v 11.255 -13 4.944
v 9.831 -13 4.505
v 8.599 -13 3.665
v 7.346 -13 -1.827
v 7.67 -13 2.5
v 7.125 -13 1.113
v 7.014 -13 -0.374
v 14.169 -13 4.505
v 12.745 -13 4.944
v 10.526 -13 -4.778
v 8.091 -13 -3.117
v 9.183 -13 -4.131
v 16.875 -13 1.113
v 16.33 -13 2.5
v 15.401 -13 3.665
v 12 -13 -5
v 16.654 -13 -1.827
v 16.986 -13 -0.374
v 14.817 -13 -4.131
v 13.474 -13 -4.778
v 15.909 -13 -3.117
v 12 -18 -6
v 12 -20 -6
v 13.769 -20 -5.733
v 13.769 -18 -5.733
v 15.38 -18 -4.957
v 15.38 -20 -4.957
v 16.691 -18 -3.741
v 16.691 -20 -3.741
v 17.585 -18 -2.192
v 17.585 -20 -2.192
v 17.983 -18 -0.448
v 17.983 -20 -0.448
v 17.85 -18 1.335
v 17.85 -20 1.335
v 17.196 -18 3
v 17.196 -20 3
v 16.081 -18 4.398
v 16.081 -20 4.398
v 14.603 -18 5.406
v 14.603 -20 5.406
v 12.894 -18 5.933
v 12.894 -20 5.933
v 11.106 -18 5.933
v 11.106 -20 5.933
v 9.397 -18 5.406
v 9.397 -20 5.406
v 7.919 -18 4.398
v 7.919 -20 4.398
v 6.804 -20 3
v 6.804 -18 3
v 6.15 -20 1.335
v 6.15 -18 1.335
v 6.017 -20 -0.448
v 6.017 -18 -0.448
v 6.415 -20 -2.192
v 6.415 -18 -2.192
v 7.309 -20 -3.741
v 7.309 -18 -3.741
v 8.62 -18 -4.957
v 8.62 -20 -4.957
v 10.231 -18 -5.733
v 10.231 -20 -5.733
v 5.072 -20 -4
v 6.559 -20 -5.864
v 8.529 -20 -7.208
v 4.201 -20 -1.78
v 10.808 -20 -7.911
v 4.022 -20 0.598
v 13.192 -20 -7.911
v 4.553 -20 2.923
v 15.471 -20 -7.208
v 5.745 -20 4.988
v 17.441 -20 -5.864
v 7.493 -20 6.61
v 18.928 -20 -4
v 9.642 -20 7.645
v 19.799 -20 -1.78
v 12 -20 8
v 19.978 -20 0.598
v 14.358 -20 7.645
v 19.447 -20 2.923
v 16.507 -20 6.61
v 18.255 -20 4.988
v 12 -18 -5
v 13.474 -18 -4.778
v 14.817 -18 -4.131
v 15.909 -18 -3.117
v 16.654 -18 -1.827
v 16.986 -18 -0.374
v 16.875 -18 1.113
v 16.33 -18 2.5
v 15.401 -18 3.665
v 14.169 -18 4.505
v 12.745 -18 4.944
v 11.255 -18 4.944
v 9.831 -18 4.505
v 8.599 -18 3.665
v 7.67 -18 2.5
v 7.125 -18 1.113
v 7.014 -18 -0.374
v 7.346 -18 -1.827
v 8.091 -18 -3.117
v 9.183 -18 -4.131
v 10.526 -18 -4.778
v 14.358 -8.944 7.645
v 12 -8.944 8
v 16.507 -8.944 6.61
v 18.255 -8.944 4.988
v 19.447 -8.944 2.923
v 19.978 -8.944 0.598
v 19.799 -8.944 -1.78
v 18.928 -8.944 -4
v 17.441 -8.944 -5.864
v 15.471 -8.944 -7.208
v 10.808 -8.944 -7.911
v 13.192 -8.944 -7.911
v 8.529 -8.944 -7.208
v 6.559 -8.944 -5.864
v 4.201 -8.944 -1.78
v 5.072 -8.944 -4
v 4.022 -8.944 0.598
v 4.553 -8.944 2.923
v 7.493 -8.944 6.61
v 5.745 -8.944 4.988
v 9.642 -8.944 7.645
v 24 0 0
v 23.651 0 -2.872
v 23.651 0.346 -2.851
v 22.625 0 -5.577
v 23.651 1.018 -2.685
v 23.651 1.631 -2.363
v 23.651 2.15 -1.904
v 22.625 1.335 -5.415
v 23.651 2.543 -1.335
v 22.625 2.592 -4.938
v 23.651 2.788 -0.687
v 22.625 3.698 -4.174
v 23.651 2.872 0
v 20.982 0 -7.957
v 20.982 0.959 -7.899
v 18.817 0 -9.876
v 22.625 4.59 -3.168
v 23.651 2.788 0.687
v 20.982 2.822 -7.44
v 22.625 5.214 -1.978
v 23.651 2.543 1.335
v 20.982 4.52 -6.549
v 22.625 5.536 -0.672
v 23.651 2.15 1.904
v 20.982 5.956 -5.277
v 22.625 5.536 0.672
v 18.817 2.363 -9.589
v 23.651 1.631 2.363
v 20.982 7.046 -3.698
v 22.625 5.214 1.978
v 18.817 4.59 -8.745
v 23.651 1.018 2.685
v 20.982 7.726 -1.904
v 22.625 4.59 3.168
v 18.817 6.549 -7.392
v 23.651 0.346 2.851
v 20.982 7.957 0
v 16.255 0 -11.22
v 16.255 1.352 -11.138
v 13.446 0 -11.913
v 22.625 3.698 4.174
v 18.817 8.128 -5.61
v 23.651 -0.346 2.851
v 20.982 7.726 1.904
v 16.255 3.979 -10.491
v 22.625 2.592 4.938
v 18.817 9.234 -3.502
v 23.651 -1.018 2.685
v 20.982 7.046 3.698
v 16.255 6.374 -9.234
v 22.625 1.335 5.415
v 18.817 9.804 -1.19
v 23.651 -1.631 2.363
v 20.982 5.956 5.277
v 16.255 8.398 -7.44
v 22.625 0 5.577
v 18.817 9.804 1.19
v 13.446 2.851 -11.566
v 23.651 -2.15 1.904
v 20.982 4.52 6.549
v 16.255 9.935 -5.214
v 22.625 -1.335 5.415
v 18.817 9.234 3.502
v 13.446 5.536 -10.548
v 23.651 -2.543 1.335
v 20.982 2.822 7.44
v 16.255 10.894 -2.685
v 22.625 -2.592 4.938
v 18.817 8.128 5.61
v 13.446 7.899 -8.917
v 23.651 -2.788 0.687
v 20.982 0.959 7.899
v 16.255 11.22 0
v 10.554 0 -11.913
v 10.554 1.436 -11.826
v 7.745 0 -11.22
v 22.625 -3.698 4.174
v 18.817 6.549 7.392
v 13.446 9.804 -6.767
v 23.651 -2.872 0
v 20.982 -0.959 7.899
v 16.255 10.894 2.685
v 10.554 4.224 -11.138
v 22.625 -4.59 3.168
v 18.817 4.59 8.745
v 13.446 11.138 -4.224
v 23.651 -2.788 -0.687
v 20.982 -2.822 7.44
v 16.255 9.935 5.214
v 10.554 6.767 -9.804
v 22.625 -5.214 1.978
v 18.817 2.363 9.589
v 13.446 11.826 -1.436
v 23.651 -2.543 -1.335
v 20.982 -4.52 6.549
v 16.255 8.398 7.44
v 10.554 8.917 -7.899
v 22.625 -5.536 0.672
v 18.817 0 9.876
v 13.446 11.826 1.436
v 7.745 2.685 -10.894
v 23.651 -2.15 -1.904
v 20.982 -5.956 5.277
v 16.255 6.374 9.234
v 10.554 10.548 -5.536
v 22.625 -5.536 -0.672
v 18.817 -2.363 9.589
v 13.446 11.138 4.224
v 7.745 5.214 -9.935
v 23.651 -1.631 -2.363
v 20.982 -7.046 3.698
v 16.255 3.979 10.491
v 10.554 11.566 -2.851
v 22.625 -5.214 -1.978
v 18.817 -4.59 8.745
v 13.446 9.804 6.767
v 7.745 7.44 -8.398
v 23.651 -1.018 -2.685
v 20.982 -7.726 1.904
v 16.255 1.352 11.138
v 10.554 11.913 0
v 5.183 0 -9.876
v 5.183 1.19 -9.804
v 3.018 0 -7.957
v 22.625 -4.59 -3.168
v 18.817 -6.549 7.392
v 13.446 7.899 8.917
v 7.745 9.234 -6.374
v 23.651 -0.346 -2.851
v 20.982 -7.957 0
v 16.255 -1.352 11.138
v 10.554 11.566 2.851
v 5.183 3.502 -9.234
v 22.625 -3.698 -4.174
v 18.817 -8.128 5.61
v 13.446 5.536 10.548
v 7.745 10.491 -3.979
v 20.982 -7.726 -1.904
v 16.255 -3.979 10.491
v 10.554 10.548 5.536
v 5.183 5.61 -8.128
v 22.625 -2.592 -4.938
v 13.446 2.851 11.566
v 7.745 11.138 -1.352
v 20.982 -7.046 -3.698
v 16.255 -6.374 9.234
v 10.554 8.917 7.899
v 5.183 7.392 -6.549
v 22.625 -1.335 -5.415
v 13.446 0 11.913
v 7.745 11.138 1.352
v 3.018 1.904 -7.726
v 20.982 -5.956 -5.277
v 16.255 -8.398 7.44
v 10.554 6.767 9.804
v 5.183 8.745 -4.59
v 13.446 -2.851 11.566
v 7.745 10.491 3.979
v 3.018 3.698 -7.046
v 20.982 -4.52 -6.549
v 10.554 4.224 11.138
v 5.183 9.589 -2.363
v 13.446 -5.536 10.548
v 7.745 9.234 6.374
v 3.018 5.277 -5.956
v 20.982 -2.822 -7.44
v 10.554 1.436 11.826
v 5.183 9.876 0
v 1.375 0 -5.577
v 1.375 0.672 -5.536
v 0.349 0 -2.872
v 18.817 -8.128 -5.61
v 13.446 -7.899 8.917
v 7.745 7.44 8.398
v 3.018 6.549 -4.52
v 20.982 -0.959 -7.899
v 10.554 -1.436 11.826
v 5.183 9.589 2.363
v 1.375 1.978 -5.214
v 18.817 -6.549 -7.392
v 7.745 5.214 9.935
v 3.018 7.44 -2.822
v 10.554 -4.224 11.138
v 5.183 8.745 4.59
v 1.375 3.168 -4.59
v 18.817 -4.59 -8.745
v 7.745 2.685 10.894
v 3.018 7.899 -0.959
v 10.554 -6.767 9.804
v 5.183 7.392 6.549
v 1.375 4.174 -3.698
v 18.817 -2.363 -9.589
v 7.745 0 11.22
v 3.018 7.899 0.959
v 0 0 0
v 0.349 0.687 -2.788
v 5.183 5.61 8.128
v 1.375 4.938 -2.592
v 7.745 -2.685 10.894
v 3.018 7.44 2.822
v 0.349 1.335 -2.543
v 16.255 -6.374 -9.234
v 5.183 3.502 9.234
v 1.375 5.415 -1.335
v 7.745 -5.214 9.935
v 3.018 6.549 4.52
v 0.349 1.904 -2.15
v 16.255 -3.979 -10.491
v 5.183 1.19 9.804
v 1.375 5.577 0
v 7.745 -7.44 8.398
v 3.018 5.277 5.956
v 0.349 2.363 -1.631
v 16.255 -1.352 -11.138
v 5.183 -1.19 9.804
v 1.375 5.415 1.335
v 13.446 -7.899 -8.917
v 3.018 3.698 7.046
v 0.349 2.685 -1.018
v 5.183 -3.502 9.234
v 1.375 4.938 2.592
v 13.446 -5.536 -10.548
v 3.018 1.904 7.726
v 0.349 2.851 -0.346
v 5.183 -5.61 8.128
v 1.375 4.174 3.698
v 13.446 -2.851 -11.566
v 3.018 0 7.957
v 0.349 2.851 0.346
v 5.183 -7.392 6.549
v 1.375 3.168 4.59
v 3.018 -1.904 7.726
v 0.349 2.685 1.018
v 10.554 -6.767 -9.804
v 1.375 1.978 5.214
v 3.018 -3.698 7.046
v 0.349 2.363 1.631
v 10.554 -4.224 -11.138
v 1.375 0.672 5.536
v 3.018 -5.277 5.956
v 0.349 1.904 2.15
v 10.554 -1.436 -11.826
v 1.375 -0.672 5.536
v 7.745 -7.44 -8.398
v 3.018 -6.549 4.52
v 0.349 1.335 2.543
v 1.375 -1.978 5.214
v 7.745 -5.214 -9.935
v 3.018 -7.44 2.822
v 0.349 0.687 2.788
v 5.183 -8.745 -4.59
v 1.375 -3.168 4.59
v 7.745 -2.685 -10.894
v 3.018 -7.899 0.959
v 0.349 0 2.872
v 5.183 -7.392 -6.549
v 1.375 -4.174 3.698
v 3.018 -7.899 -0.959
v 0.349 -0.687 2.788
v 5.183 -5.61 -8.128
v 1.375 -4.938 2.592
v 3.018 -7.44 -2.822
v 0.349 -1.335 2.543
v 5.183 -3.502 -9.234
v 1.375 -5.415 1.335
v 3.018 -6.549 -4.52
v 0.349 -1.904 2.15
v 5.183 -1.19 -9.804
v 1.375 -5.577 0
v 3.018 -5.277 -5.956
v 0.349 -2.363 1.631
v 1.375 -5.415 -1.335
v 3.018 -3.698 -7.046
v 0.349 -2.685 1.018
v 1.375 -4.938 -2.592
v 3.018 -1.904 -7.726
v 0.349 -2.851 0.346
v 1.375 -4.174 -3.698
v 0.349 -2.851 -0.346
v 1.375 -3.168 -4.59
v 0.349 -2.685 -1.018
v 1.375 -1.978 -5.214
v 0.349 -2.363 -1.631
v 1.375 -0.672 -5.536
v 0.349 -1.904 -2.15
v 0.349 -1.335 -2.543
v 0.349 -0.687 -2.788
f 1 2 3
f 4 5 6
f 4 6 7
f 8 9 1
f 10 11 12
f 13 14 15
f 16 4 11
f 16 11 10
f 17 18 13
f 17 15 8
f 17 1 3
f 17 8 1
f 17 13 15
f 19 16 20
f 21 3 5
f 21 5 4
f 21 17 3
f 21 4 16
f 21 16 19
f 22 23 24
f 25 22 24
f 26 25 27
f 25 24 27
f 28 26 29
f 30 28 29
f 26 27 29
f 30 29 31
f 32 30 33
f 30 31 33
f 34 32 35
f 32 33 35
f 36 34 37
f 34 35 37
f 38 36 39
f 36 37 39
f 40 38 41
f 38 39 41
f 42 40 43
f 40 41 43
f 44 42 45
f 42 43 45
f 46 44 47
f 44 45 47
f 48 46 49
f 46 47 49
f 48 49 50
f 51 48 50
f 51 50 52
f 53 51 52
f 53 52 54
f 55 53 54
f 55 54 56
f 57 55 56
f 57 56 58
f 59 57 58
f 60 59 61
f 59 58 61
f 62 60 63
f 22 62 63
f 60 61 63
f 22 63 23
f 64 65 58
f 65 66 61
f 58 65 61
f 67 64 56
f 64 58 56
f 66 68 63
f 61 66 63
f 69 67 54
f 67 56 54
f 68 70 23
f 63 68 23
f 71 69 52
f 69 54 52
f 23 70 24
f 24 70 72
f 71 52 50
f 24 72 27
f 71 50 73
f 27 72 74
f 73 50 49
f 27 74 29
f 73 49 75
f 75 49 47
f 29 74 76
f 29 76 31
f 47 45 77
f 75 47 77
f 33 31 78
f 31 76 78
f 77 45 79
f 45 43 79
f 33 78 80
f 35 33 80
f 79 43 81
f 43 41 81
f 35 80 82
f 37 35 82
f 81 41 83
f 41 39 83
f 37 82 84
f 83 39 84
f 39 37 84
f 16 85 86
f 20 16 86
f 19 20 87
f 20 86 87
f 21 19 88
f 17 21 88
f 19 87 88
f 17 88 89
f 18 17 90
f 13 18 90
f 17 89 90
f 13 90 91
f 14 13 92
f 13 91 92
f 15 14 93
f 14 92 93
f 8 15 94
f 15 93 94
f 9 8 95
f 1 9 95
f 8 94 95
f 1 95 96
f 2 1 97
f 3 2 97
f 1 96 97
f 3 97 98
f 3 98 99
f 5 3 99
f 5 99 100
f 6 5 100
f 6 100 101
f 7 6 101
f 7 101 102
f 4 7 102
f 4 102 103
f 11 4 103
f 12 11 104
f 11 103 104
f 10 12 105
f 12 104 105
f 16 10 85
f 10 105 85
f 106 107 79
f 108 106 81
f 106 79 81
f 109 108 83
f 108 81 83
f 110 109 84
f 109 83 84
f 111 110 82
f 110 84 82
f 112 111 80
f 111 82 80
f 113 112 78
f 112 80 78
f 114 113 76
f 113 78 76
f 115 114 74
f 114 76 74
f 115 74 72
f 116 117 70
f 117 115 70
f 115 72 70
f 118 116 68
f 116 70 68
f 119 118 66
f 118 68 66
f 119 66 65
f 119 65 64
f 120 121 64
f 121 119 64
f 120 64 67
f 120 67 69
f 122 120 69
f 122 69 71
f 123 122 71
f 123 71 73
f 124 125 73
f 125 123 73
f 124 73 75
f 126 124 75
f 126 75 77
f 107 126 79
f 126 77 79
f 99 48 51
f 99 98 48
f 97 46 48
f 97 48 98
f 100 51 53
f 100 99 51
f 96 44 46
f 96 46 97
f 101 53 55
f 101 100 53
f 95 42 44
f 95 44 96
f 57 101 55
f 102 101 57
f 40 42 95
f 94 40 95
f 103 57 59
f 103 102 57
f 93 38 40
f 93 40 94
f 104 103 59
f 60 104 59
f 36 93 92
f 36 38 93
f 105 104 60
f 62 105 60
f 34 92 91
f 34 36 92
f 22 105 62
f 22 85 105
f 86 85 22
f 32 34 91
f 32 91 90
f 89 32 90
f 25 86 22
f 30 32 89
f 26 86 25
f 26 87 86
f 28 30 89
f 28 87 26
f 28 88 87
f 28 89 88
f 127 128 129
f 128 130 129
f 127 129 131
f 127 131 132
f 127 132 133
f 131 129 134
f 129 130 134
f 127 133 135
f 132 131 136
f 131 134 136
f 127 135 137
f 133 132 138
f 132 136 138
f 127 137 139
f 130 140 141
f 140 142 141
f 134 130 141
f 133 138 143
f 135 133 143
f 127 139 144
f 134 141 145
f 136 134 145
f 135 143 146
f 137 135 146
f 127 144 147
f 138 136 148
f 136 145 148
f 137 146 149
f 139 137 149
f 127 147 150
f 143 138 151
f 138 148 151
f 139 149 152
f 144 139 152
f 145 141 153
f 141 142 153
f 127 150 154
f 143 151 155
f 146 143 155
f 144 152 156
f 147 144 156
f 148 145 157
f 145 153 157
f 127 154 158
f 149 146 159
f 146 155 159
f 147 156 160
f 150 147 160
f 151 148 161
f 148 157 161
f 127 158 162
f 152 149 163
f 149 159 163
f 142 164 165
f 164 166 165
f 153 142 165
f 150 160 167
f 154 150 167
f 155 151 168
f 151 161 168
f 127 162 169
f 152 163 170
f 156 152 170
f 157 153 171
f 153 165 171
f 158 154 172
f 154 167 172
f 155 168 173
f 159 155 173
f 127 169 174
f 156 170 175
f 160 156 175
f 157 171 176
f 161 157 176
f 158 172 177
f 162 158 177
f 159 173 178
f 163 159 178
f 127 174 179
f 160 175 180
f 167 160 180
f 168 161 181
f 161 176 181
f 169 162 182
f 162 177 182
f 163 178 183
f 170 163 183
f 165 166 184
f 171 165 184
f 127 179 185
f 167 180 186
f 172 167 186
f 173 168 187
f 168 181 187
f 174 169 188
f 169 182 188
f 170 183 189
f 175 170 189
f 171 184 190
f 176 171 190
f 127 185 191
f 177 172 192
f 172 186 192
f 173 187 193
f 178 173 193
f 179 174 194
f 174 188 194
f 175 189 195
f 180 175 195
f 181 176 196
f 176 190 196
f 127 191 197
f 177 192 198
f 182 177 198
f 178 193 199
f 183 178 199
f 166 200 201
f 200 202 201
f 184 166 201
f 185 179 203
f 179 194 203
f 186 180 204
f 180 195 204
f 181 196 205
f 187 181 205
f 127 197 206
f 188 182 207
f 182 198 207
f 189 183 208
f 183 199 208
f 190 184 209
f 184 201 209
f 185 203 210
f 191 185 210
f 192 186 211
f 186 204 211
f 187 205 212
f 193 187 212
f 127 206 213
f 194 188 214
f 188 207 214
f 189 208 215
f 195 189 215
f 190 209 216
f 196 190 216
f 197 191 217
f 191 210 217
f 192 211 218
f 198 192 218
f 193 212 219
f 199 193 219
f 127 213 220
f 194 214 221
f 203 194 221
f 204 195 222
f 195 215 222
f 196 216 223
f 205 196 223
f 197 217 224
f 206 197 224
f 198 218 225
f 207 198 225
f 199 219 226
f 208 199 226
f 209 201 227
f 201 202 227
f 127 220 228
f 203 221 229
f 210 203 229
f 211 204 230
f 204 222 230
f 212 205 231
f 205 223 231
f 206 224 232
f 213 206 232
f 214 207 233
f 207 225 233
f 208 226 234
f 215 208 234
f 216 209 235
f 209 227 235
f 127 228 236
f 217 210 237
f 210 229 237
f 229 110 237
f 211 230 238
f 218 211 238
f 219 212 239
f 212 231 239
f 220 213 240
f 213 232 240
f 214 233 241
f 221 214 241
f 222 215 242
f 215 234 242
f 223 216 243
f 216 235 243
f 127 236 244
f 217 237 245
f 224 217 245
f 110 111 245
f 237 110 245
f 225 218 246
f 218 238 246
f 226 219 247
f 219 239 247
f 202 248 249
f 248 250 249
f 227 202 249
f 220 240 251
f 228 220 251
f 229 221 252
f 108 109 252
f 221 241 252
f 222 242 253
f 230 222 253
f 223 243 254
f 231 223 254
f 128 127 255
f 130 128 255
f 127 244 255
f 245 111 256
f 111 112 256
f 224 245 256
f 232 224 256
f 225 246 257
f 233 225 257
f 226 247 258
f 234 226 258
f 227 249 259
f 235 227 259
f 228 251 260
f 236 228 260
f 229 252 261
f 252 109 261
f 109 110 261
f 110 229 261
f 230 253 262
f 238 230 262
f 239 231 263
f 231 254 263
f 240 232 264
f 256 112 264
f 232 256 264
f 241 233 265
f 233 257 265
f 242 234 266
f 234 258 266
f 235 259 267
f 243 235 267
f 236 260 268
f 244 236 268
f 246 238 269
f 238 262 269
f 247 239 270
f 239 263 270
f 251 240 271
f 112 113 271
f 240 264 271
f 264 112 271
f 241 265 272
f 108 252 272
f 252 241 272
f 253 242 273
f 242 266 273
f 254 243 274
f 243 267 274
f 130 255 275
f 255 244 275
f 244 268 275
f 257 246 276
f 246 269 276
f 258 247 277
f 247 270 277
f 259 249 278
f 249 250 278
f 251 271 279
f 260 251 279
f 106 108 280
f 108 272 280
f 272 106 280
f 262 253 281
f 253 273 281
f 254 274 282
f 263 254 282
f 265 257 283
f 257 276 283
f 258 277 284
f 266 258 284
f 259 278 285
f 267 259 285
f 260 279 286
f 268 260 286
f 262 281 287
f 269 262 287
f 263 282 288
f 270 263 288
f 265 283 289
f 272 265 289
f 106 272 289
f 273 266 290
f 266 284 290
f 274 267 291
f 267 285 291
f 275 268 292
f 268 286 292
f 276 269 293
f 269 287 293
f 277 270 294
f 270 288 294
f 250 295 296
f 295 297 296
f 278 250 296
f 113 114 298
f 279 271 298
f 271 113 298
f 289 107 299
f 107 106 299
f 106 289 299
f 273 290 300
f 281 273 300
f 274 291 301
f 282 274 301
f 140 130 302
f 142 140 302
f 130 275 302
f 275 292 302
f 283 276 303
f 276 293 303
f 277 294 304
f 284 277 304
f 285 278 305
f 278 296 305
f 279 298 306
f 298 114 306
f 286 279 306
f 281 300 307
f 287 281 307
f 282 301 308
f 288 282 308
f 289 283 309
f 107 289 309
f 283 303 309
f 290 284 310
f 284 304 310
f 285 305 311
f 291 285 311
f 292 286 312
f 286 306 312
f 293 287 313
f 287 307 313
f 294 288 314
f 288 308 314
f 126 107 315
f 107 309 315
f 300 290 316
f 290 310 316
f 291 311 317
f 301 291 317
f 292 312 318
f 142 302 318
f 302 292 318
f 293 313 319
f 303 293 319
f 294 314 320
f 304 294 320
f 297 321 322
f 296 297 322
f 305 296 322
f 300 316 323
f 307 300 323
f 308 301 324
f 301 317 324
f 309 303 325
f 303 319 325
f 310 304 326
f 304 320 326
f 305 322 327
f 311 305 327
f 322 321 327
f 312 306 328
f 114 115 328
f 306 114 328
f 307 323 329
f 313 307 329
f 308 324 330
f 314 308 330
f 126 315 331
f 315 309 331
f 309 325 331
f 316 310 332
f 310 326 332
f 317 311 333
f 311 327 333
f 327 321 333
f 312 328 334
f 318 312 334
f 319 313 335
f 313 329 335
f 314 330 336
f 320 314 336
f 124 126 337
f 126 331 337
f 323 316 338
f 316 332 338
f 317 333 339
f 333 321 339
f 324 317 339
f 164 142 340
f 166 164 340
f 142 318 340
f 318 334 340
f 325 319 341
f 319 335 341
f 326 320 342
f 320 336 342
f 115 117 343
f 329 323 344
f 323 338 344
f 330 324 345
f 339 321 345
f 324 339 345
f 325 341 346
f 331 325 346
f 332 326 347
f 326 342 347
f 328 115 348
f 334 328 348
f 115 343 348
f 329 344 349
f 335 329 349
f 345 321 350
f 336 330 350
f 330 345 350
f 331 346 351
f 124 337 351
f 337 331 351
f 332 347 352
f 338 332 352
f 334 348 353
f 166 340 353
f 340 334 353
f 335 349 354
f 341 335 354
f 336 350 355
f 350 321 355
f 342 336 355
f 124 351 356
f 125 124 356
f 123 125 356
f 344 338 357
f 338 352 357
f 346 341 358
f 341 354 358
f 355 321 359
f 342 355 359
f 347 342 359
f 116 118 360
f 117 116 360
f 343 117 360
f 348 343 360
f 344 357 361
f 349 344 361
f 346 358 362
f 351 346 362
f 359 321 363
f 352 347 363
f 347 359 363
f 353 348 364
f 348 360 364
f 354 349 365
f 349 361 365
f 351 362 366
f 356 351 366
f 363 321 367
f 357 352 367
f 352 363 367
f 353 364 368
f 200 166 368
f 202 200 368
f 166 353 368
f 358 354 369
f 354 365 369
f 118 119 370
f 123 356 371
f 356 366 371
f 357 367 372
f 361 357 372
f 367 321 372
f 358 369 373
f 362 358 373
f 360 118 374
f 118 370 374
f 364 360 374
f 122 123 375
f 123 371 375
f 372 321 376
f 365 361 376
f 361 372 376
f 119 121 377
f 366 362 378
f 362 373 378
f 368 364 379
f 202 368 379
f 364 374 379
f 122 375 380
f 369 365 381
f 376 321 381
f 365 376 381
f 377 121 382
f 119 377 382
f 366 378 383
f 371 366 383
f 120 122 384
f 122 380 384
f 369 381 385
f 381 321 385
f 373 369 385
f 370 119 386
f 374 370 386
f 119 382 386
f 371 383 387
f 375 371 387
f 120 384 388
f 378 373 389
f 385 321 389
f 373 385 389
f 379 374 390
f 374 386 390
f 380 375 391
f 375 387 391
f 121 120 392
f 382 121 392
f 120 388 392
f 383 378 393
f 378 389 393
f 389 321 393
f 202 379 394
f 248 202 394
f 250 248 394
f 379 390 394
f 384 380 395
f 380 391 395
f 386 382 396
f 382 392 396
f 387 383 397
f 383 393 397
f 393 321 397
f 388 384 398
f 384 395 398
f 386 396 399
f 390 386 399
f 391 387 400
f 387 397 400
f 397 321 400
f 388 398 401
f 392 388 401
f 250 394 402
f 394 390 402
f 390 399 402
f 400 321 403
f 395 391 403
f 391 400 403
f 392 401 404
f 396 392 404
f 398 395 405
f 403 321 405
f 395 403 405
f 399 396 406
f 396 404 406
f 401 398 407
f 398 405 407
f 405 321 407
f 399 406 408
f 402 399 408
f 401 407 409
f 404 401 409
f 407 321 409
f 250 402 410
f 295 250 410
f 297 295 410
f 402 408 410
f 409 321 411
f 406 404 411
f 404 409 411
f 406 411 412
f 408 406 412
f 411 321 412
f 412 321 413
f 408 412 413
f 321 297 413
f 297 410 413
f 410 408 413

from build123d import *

# Parameters (mm, degrees)
BOSS_EXTRUDE1_REACH      = 52.706
BOSS_EXTRUDE1_END_RADIUS = 12
BOSS_EXTRUDE1_START      = 5
SKETCH3_R                = 8
SKETCH4_R                = 6
CUT_EXTRUDE2_DEPTH       = 2
SKETCH5_R                = 5
CUT_EXTRUDE3_DEPTH       = 5


with BuildPart() as part:
    # Sketch2 → Revolve1 (revolve)
    with BuildSketch(Plane(origin=(0, 0, 0), x_dir=(1, 0, 0), z_dir=(0, 1, 0))):
        with BuildLine():
            Line((0, 0), (24, 0))
            ThreePointArc((24, 0), (12, 12), (0, 0))
        make_face()
    revolve(axis=Axis((0, 0, 0), (1, 0, 0)))

    # Boss-Extrude1: up to this sphere (the profile starts outside it)
    boss_extrude1_end = Location((12, 0, 0)) * Sphere(BOSS_EXTRUDE1_END_RADIUS, mode=Mode.PRIVATE)
    # Sketch3 → Boss-Extrude1 (add, up to the surface)
    with BuildSketch(Plane(origin=(0, -25, 0), x_dir=(1, 0, 0), z_dir=(0, 1, 0)).offset(BOSS_EXTRUDE1_START), mode=Mode.PRIVATE) as boss_extrude1_sk1:
        with Locations(Location((12, 0, 0), (0, 0, 270))):
            Circle(SKETCH3_R)
    boss_extrude1_tool1 = extrude(boss_extrude1_sk1.sketch, amount=BOSS_EXTRUDE1_REACH, mode=Mode.PRIVATE) - boss_extrude1_end
    add(boss_extrude1_tool1.solids().sort_by_distance((12, -20, 0))[0])

    # Sketch4 → Cut-Extrude2 (cut)
    with BuildSketch(Plane.XZ.offset(20)):
        with Locations(Location((12, 0, 0), (0, 0, 270))):
            Circle(SKETCH4_R)
    extrude(amount=-CUT_EXTRUDE2_DEPTH, mode=Mode.SUBTRACT)

    # Sketch5 → Cut-Extrude3 (cut)
    with BuildSketch(Plane.XZ.offset(18)):
        with Locations(Location((12, 0, 0), (0, 0, 270))):
            Circle(SKETCH5_R)
    extrude(amount=-CUT_EXTRUDE3_DEPTH, mode=Mode.SUBTRACT)


solid = part.part
